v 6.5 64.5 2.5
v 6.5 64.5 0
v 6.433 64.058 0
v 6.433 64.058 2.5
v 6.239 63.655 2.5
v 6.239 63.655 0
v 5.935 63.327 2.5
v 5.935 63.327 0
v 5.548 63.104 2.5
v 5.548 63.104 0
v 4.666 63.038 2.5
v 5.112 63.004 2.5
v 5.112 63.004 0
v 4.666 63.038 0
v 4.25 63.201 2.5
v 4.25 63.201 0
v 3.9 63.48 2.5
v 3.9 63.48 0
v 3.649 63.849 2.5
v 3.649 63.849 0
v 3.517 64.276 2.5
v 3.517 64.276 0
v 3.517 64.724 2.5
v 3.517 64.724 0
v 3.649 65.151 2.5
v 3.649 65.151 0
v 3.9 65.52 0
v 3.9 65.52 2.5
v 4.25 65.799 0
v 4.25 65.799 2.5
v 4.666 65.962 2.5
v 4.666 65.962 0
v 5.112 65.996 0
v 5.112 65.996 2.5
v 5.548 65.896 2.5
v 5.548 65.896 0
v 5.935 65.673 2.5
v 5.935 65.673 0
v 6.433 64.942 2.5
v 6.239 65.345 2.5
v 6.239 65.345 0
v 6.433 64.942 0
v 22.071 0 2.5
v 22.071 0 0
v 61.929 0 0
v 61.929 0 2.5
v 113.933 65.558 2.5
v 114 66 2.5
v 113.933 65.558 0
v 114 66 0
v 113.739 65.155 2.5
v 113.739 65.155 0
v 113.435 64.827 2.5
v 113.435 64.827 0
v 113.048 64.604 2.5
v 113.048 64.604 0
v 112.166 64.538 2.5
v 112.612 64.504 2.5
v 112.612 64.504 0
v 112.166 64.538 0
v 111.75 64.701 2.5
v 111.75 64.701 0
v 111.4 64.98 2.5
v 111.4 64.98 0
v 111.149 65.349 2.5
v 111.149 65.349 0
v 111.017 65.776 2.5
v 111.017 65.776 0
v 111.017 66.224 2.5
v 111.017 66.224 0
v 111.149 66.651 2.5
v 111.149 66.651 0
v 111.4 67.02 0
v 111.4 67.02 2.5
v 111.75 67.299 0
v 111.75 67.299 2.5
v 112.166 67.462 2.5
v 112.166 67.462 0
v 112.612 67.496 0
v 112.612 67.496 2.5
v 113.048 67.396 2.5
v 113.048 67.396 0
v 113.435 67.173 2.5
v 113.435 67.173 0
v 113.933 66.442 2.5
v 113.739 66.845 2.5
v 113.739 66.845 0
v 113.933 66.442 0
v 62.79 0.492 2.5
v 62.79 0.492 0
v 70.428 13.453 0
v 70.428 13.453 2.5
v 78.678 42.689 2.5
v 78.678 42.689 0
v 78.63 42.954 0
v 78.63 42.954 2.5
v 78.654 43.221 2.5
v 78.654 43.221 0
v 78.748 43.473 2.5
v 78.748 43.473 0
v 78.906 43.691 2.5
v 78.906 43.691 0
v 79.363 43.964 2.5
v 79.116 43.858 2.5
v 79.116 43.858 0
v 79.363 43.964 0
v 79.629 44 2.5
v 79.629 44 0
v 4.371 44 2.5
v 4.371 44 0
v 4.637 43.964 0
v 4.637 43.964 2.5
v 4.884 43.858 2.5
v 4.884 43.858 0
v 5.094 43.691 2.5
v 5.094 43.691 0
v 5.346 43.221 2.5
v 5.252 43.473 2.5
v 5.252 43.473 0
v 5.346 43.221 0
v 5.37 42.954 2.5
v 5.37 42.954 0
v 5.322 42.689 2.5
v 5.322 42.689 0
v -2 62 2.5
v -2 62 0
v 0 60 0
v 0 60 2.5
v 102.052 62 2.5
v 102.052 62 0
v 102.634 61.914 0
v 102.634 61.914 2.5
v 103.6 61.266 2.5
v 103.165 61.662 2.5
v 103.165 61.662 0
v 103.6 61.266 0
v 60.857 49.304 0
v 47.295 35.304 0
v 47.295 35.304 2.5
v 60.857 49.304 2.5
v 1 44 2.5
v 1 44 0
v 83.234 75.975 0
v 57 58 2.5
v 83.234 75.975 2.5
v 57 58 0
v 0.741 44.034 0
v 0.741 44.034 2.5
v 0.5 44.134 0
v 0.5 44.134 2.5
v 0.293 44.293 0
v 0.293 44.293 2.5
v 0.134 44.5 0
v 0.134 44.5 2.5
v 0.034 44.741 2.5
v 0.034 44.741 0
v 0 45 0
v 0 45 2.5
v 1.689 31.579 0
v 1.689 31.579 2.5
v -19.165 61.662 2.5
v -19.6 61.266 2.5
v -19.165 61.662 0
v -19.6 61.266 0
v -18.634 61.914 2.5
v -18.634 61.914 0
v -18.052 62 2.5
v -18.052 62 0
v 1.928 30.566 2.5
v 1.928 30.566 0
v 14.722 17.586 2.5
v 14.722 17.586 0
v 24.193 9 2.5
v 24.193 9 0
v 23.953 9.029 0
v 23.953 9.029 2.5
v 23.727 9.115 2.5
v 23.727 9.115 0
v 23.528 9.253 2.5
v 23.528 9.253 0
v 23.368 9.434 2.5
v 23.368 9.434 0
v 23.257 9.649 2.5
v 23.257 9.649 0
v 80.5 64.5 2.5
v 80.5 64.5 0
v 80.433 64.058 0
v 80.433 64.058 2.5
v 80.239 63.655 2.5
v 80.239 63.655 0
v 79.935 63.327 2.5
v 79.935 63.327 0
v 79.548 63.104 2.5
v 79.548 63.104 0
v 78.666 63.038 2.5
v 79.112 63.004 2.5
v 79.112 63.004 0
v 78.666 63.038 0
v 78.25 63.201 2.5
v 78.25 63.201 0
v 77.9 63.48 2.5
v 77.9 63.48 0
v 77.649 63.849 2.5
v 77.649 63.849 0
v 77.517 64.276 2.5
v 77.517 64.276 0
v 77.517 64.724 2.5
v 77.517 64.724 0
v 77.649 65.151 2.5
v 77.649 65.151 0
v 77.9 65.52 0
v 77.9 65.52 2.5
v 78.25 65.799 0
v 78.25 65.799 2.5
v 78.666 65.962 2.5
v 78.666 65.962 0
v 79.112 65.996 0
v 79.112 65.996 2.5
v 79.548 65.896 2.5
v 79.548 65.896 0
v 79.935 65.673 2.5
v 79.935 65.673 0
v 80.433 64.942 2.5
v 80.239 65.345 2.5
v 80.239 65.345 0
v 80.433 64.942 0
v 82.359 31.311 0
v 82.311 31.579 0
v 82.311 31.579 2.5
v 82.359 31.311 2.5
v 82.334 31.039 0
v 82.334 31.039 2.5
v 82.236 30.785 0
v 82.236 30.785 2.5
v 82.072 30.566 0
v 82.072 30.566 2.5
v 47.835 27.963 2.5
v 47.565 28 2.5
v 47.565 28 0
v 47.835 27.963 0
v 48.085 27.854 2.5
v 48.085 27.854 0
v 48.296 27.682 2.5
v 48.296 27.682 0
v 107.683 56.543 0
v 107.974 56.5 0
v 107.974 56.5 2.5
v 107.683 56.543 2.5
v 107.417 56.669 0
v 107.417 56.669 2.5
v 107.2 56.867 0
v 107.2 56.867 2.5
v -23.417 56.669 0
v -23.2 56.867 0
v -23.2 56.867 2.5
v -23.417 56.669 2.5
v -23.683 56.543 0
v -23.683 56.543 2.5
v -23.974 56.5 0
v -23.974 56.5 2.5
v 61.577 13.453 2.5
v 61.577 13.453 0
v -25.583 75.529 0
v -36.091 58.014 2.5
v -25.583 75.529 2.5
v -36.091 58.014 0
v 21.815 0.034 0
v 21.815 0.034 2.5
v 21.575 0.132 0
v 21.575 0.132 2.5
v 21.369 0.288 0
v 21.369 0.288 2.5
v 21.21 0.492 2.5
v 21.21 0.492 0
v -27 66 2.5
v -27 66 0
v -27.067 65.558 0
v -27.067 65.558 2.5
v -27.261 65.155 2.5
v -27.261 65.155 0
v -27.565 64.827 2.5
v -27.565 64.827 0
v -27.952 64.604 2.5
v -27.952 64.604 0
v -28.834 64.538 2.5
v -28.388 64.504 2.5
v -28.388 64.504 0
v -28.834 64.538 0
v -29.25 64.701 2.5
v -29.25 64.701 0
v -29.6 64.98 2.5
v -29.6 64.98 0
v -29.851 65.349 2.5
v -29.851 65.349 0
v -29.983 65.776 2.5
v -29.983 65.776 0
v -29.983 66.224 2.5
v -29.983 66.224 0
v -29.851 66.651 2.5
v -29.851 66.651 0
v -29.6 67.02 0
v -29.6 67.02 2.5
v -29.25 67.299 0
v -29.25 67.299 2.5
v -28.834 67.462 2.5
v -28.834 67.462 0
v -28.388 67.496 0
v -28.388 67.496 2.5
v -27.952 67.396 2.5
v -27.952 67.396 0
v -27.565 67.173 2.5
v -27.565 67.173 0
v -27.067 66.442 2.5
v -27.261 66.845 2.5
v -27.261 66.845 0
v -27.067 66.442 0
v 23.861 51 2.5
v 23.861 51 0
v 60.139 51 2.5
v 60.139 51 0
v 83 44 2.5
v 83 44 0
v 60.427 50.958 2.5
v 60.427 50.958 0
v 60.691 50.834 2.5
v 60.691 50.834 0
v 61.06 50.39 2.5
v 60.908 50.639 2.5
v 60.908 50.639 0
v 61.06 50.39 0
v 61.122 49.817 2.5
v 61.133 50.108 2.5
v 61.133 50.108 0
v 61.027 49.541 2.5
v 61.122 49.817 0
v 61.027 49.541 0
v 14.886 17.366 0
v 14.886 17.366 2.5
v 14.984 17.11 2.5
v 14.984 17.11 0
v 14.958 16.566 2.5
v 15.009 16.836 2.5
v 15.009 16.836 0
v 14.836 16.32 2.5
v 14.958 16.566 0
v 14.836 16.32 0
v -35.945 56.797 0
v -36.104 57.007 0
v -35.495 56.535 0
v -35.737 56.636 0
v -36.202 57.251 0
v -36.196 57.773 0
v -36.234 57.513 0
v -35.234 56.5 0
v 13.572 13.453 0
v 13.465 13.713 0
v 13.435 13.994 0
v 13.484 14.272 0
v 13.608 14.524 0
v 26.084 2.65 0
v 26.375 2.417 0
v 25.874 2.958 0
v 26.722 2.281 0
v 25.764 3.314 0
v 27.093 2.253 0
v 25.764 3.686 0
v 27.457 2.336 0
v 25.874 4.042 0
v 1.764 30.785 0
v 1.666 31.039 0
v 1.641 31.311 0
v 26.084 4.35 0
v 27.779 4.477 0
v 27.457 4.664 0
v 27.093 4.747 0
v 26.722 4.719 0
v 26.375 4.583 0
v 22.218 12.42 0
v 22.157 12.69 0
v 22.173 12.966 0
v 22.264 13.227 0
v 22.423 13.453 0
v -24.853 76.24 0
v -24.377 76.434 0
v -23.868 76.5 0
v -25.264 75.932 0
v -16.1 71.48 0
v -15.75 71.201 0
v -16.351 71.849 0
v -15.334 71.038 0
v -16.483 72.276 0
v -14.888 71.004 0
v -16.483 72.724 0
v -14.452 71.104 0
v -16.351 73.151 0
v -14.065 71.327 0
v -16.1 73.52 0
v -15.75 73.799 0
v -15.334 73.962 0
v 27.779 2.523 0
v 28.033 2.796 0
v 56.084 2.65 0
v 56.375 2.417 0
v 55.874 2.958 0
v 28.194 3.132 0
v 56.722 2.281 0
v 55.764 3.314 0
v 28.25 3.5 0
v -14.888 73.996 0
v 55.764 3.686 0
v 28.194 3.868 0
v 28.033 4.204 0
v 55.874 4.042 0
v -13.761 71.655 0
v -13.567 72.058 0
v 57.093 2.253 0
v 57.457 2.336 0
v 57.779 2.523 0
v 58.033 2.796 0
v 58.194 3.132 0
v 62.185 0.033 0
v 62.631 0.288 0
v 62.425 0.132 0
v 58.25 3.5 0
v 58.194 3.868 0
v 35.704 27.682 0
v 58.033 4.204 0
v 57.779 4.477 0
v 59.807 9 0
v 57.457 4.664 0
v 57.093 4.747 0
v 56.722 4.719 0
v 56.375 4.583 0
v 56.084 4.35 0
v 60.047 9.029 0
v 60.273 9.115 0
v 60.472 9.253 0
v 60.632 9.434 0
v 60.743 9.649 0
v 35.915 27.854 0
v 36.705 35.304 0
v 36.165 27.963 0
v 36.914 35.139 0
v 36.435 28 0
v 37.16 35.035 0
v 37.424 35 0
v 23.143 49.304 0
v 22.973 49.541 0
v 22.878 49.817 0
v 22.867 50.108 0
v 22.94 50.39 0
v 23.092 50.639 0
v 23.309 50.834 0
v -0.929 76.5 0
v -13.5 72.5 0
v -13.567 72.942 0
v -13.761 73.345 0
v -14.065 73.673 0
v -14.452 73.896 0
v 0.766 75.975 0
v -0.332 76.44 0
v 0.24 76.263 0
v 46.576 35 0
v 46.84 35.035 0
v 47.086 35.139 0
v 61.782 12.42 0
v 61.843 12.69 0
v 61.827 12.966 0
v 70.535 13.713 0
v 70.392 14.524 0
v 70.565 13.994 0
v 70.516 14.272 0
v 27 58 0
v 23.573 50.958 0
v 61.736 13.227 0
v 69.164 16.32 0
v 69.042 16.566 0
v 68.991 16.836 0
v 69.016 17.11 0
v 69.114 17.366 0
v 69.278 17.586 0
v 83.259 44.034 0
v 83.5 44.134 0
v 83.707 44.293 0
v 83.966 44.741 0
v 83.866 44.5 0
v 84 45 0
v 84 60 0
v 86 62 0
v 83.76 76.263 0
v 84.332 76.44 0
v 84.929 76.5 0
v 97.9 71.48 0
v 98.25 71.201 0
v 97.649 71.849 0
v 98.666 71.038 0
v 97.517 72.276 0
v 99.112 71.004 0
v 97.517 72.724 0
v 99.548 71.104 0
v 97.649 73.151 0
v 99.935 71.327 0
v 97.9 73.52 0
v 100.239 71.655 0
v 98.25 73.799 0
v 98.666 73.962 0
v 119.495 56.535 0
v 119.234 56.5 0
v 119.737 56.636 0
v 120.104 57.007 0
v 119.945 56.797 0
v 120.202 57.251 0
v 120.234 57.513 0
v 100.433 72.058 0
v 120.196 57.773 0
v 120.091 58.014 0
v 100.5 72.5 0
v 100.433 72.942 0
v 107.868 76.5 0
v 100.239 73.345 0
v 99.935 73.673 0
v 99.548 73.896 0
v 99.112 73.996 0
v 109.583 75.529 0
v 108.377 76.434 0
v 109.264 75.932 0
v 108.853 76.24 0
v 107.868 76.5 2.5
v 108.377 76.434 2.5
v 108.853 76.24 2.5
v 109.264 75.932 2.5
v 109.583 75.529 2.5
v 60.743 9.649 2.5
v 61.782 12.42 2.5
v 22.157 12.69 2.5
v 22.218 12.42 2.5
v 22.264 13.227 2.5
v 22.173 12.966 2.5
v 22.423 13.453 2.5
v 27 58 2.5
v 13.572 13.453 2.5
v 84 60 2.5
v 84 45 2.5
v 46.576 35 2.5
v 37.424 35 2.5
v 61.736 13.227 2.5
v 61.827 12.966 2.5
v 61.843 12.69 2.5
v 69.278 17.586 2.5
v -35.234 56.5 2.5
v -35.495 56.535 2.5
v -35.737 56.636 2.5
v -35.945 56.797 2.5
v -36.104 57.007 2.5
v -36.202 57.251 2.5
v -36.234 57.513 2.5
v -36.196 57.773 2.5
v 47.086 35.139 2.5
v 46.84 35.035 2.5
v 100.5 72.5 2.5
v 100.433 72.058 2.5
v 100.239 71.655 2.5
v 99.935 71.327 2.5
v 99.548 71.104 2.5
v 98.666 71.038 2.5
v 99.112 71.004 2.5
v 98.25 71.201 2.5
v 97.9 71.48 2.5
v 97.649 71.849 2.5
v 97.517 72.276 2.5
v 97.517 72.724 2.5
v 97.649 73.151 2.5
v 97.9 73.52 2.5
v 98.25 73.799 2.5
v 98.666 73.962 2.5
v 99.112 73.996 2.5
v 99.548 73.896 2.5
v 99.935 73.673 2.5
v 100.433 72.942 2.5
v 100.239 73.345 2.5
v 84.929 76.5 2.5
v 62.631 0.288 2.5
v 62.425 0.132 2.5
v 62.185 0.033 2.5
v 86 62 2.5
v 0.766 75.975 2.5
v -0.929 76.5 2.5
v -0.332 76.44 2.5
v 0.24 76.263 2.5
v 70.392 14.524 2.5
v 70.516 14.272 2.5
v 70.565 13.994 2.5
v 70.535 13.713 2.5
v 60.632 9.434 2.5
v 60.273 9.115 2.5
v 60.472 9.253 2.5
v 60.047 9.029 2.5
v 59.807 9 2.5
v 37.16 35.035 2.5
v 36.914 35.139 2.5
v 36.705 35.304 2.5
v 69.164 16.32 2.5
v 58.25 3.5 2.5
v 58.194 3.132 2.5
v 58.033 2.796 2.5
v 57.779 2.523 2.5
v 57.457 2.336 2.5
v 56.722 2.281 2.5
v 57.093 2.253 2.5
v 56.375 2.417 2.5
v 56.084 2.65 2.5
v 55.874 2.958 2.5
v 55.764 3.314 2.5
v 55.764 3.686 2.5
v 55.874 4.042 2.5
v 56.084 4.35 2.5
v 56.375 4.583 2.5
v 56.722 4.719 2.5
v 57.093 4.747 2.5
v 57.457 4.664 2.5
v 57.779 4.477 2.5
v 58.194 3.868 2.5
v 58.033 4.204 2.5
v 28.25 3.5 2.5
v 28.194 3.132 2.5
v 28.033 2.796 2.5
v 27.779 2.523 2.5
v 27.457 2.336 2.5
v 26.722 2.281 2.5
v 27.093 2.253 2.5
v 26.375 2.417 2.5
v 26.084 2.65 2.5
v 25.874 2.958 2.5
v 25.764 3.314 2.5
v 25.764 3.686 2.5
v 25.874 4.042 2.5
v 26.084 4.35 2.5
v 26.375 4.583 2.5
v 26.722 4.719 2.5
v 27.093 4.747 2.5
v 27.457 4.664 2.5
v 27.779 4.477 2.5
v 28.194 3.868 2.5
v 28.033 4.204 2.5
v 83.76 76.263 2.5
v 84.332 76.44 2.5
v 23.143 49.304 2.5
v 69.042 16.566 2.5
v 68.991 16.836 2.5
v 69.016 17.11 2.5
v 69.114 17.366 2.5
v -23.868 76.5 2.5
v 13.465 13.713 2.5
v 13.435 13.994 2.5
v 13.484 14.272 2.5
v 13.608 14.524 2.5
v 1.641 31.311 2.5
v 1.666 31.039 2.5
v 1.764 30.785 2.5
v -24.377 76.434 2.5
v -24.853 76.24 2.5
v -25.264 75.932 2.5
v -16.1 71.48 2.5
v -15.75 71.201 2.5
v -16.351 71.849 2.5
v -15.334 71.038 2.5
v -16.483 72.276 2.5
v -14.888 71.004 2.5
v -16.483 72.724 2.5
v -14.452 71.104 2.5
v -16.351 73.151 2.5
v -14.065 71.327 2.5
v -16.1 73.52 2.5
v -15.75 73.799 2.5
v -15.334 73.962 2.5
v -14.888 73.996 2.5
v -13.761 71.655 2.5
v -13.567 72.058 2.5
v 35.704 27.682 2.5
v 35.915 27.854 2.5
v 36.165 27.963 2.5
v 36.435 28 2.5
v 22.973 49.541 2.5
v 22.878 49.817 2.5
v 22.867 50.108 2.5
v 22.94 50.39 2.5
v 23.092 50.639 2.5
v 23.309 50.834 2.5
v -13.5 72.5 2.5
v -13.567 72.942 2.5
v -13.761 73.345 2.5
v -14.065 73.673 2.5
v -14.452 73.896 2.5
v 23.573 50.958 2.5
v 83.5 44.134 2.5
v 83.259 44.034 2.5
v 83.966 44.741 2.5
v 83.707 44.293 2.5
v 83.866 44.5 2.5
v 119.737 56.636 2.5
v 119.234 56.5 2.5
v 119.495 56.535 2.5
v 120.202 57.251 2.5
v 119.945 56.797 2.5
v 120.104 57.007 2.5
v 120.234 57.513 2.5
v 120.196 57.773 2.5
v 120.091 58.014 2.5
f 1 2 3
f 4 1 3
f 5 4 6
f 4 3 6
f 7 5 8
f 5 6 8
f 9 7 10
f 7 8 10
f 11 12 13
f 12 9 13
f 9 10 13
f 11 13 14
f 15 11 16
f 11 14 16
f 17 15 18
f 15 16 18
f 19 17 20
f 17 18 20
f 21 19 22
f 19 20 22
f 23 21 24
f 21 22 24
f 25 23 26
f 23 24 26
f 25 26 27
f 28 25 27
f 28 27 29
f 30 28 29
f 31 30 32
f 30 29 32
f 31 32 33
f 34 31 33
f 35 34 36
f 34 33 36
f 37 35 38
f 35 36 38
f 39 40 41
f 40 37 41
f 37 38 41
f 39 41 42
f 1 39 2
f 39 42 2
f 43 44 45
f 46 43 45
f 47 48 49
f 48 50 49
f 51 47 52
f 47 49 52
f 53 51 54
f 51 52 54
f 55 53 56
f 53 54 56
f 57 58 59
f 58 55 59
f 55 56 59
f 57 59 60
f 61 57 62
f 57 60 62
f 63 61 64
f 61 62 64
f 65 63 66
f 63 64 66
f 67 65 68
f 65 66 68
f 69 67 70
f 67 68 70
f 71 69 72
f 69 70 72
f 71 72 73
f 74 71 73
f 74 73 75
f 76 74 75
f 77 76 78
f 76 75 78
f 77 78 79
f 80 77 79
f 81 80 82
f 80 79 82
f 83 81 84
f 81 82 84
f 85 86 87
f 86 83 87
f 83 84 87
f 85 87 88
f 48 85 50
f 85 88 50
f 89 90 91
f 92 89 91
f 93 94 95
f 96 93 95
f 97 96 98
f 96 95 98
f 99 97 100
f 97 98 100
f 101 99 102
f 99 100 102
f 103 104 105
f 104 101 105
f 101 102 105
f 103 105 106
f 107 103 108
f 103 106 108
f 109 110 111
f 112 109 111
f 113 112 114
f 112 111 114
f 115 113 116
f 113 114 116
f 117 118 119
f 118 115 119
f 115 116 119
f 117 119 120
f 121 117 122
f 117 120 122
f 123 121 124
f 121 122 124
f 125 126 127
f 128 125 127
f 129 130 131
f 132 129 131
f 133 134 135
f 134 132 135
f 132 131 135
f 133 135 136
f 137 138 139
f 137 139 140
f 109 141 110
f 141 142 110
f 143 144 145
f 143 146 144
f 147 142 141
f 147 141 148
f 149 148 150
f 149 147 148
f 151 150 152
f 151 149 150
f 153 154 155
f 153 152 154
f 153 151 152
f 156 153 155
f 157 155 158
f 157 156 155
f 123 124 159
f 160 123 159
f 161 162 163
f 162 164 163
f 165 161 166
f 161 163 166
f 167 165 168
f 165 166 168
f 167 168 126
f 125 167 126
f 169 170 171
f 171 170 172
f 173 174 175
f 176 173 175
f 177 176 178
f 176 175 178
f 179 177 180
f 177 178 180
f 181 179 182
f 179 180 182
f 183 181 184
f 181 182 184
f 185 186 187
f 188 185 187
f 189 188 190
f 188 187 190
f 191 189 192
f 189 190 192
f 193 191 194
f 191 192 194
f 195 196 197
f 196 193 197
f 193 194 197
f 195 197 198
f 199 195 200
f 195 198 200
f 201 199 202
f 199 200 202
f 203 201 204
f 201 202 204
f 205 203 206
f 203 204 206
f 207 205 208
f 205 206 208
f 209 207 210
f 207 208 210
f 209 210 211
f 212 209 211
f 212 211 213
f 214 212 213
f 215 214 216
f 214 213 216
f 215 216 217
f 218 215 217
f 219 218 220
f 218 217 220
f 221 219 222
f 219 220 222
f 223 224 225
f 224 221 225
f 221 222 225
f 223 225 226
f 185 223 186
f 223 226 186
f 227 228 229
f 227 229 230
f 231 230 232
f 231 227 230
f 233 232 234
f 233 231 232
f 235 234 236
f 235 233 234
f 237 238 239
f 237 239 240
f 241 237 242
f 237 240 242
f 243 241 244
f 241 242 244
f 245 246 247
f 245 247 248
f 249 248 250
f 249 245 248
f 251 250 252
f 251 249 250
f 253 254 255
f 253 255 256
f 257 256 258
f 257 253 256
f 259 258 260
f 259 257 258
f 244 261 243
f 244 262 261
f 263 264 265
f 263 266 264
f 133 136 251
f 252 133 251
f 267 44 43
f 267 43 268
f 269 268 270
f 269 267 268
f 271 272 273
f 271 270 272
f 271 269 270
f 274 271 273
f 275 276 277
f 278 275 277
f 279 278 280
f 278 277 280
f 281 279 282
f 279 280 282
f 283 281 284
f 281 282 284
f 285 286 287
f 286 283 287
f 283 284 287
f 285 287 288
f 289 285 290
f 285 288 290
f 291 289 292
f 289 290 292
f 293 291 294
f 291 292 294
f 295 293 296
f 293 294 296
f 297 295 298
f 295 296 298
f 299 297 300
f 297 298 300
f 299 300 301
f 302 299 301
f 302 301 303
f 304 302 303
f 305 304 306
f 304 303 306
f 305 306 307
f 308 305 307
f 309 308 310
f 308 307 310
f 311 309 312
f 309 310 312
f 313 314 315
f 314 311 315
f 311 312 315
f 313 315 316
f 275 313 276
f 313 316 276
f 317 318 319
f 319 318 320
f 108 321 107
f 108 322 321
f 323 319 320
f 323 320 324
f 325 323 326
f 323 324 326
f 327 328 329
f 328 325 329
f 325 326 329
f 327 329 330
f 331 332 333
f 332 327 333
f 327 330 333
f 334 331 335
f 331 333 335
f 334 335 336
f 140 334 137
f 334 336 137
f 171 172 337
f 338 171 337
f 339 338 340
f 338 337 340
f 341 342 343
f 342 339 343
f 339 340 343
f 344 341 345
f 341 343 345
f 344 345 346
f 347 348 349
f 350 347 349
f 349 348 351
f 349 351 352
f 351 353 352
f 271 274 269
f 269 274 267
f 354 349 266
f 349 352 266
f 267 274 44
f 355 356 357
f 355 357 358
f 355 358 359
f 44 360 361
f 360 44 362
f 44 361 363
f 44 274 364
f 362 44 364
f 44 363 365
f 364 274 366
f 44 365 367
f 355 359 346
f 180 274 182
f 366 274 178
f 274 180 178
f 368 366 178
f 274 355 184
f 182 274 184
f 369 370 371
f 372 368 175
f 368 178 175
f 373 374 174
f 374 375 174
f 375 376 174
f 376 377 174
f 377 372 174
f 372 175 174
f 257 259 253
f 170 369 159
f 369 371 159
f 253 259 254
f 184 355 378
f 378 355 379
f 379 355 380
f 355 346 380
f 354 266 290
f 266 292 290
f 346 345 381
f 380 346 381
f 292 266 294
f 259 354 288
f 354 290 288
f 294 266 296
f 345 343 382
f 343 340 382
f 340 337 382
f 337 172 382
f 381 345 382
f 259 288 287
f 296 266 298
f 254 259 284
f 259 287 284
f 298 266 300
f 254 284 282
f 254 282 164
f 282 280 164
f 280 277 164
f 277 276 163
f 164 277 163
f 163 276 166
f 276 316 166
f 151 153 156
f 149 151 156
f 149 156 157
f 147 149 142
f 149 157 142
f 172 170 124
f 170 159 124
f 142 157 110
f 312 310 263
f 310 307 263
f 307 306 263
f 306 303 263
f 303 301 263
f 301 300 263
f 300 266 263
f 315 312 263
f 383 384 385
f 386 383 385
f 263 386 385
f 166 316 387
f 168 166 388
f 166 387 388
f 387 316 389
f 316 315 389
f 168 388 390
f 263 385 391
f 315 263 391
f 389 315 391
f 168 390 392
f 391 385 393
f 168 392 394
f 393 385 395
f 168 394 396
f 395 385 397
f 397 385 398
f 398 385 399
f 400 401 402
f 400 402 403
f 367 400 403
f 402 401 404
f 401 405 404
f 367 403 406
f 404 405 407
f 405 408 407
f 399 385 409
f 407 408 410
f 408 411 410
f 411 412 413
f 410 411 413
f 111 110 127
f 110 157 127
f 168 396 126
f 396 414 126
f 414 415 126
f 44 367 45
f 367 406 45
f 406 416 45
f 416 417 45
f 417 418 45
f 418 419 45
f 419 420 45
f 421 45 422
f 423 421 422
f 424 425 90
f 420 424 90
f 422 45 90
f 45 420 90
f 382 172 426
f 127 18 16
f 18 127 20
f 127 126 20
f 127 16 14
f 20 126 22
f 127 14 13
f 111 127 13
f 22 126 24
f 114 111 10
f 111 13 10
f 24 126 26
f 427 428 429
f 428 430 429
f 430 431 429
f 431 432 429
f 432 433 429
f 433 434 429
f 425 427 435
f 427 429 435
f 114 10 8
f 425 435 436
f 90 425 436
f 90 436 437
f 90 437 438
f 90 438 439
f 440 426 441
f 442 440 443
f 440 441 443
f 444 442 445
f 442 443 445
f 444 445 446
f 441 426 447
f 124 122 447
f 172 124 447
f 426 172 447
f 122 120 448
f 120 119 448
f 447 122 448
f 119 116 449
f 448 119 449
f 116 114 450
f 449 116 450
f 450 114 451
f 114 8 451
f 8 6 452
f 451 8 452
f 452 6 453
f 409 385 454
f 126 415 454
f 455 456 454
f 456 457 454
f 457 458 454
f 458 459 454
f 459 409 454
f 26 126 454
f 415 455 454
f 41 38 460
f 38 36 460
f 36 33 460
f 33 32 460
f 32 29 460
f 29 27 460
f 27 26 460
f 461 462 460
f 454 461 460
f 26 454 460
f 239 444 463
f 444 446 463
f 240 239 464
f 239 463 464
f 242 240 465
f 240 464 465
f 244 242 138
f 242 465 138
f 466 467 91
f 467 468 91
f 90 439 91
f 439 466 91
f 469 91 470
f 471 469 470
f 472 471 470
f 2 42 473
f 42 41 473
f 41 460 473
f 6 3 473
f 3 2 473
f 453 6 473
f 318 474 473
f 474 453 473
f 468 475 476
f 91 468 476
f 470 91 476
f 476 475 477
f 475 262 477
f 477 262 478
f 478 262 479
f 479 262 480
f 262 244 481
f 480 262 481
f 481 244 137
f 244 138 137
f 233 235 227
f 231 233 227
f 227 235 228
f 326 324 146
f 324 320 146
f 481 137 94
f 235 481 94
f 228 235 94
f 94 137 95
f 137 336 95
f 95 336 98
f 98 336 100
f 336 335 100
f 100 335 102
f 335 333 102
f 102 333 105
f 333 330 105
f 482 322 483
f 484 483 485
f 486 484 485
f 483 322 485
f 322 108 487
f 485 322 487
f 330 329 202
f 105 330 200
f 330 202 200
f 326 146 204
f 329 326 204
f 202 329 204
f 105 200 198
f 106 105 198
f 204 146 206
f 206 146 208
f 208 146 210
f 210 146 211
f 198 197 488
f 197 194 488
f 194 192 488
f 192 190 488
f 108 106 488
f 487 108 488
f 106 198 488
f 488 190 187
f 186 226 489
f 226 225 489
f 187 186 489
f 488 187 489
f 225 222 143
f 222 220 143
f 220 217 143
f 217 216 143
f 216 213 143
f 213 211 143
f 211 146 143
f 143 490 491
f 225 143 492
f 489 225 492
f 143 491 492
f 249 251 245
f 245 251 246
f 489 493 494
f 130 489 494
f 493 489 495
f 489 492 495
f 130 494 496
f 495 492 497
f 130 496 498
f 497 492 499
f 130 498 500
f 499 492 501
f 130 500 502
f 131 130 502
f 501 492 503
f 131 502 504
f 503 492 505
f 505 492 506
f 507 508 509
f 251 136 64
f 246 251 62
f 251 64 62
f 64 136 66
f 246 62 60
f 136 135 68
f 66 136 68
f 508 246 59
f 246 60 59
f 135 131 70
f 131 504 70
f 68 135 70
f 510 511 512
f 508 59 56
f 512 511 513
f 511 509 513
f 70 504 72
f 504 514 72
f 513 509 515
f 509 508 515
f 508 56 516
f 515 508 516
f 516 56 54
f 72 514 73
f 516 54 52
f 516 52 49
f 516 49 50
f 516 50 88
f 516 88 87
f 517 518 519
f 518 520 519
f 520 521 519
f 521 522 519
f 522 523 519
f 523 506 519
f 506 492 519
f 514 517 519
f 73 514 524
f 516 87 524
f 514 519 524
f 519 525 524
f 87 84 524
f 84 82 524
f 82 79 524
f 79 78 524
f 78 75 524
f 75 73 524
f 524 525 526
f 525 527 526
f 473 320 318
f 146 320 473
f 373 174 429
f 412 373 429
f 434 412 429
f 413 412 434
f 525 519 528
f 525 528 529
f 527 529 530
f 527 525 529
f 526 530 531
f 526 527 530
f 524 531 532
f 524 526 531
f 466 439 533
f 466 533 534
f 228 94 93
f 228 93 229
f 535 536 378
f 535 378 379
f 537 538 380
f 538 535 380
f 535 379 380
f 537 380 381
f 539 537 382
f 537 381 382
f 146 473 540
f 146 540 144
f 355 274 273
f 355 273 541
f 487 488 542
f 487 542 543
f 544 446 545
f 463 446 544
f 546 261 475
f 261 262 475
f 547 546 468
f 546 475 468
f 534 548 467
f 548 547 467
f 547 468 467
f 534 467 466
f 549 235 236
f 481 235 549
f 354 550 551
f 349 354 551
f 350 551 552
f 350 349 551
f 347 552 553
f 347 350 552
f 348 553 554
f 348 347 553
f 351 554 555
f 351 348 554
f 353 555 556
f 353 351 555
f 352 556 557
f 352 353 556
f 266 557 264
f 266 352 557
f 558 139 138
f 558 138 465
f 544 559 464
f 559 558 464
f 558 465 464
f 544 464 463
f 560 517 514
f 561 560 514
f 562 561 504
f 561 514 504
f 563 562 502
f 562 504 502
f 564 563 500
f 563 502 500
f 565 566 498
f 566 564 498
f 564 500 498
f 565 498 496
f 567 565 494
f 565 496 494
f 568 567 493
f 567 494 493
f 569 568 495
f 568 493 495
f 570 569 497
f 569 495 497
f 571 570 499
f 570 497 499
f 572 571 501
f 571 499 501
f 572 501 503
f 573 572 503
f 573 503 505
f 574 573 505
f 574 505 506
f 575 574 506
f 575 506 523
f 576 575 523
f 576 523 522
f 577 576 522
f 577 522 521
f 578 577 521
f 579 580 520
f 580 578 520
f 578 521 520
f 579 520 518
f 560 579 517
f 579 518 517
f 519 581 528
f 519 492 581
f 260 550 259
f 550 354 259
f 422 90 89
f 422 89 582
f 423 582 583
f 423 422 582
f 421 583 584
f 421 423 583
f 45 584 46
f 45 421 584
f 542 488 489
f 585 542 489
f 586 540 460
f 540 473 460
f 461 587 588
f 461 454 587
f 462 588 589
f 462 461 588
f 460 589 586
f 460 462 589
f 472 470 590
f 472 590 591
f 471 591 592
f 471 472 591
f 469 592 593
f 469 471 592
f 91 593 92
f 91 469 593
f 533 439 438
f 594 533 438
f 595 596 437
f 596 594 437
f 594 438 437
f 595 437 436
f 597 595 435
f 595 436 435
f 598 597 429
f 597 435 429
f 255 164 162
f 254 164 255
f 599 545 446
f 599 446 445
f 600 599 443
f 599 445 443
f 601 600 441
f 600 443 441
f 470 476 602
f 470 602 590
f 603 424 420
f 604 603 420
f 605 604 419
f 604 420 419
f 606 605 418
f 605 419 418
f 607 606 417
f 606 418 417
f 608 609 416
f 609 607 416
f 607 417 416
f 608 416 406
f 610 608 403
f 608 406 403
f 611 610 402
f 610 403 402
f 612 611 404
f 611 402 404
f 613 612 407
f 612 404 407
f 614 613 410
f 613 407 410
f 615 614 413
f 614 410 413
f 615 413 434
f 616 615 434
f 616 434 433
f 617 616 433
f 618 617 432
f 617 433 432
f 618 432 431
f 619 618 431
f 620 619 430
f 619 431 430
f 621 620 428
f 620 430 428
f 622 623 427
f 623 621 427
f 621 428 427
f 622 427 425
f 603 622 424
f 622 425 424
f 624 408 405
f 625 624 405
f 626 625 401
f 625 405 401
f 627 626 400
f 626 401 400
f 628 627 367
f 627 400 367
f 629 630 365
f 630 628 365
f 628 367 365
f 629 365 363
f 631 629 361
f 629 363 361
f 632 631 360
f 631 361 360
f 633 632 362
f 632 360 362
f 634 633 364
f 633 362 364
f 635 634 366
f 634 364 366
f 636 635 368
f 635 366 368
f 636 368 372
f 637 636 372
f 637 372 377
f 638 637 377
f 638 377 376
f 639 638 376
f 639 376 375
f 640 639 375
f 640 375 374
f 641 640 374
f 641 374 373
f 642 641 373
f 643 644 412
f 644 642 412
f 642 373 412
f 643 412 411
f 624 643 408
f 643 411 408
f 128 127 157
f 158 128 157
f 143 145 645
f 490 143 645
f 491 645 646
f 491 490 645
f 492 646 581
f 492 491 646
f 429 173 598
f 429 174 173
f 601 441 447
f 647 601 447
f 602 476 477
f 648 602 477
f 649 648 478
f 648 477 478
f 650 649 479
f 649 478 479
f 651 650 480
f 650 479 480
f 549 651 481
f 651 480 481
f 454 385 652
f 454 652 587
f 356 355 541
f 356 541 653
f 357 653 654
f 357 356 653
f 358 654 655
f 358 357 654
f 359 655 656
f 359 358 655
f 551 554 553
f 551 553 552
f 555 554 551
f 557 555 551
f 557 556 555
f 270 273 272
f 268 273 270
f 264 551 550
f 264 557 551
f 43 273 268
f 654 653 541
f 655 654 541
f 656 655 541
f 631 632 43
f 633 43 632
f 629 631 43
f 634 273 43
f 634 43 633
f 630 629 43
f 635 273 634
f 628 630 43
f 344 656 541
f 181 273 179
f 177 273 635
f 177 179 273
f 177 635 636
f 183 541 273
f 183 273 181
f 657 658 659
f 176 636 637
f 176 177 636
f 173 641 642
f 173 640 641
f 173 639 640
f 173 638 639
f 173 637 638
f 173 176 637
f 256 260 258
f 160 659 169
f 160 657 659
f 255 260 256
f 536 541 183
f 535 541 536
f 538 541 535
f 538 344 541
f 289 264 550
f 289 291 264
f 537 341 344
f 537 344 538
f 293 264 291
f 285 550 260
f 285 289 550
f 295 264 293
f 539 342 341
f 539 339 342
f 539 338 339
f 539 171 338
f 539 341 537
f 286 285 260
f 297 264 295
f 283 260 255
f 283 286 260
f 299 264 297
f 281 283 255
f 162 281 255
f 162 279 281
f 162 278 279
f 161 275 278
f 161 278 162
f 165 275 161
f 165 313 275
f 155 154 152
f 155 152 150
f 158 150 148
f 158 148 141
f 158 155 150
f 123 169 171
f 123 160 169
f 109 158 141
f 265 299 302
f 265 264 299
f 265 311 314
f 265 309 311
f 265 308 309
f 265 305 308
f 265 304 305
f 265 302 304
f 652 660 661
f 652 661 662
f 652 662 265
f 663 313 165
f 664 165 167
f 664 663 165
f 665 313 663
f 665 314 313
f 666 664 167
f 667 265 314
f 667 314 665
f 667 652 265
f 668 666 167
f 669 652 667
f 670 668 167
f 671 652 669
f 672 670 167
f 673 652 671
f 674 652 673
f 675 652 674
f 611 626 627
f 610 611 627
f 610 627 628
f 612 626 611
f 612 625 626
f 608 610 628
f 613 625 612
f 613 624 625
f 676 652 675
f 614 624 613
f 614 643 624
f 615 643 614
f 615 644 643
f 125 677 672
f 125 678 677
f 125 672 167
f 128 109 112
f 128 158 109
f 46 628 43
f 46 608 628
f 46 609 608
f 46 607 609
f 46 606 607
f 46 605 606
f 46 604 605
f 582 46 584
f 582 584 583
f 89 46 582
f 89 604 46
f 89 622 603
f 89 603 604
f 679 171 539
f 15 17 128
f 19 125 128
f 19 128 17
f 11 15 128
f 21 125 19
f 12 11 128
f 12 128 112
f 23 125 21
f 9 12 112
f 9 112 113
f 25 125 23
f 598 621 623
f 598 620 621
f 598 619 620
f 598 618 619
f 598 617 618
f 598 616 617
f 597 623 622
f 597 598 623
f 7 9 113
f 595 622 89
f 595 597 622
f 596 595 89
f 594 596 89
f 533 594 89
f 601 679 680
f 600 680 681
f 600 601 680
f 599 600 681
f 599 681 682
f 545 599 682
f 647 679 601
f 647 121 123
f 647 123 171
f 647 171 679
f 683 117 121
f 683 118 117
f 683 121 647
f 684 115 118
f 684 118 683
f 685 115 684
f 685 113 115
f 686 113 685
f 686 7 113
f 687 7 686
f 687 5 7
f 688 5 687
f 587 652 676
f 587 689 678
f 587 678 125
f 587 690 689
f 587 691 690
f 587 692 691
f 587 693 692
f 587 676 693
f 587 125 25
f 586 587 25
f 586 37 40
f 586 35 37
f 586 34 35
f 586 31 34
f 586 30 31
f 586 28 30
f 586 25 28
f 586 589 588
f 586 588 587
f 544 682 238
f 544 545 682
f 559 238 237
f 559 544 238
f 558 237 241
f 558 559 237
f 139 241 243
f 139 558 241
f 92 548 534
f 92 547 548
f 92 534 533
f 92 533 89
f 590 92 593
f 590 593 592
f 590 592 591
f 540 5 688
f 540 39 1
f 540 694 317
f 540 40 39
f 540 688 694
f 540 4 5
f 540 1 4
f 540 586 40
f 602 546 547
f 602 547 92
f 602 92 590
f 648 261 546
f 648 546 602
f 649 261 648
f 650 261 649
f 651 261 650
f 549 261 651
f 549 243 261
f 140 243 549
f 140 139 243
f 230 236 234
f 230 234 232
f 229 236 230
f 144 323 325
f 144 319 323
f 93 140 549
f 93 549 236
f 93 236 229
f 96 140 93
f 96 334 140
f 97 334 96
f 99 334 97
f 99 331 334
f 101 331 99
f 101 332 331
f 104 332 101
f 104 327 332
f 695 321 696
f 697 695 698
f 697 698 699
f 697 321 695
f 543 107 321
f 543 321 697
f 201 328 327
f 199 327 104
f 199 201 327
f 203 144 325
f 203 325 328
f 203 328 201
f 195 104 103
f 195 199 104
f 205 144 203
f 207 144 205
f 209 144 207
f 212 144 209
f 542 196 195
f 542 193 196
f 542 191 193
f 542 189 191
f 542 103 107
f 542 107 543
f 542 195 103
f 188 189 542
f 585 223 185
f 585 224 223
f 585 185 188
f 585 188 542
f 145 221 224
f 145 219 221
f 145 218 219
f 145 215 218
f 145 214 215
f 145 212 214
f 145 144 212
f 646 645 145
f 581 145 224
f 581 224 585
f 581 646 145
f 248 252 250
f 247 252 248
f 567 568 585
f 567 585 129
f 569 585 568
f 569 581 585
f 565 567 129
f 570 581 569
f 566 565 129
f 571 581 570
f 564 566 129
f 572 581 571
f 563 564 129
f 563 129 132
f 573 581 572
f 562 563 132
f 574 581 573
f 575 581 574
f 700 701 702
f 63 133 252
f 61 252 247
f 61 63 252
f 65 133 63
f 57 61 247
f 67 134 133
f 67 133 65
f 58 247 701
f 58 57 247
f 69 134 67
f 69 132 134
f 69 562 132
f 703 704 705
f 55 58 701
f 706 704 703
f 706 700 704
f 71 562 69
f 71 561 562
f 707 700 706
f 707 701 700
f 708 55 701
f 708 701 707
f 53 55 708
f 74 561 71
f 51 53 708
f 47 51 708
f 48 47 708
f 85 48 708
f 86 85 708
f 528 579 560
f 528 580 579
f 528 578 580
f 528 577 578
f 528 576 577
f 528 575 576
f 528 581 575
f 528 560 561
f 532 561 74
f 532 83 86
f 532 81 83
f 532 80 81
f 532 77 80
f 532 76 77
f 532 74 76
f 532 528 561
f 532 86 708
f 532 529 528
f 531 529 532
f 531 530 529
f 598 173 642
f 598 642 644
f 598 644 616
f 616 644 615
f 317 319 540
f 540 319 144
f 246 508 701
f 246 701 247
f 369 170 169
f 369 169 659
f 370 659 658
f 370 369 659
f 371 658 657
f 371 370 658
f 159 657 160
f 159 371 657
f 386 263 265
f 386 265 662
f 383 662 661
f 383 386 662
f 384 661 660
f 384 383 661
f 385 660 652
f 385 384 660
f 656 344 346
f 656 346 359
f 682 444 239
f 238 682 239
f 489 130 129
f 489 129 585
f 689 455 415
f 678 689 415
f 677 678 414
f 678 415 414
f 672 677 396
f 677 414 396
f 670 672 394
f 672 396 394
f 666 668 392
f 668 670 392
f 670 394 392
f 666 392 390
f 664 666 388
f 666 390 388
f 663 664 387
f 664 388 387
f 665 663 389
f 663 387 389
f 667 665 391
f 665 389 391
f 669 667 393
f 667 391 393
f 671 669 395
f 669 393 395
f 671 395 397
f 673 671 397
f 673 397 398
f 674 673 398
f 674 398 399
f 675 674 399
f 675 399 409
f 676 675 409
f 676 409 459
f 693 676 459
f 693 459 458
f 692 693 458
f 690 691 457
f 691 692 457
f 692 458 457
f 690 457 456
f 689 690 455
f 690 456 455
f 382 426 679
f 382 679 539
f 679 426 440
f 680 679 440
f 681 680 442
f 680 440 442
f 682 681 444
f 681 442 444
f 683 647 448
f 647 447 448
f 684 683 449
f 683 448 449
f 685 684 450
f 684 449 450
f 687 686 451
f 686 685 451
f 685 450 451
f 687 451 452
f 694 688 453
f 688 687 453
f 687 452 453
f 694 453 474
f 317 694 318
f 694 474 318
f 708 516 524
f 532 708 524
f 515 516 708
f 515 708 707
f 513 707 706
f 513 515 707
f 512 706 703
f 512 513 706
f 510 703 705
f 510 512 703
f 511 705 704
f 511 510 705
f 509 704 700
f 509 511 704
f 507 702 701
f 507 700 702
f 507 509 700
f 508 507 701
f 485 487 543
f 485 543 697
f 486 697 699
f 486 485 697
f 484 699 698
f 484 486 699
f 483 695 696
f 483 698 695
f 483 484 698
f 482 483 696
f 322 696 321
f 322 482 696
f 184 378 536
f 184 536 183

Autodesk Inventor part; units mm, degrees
ref_plane "YZ Plane" through (0, 0, 0) normal (1, 0, 0) x (0, 1, 0)
ref_plane "XZ Plane" through (0, 0, 0) normal (0, 1, 0) x (-1, 0, 0)
ref_plane "XY Plane" through (0, 0, 0) normal (0, 0, 1) x (1, 0, 0)
sketch "Sketch1" plane through (0, 0, 0) normal (0, 0, 1) x (1, 0, 0)
  line L0 (0, 76.5) -> (84, 76.5) construction
  line L1 (84, 76.5) -> (84, 0) construction
  line L2 (84, 0) -> (0, 0) construction
  line L3 (0, 0) -> (0, 76.5) construction
  line L4 (-37, 76.5) -> (0, 76.5) construction
  line L5 (0, 76.5) -> (0, 62) construction
  line L6 (0, 62) -> (-37, 62) construction
  line L7 (-37, 62) -> (-37, 76.5) construction
  line L8 (84, 76.5) -> (121, 76.5) construction
  line L9 (121, 76.5) -> (121, 62) construction
  line L10 (121, 62) -> (84, 62) construction
  line L11 (84, 62) -> (84, 76.5) construction
  line L12 (27, 58) -> (57, 58)
  line L13 (27, 58) -> (0.7665, 75.9748)
  line L14 (57, 58) -> (83.2335, 75.9748)
  line L15 (13.25, 14) -> (70.75, 14) construction
  line L16 (0, 76.5) -> (-25, 76.5) construction
  line L17 (-37, 76.5) -> (-37, 56.5) construction
  line L18 (-36.0913, 58.0145) -> (-25.5826, 75.529)
  line L19 (-35.2338, 56.5) -> (-23.9739, 56.5)
  line L20 (0, 62) -> (-19, 62) construction
  line L21 (-19.6002, 61.2665) -> (-23.1999, 56.8668)
  line L22 (0, 44) -> (84, 44) construction
  line L23 (1, 44) -> (4.371, 44)
  line L24 (83, 44) -> (79.629, 44)
  line L25 (1.5, 31) -> (82.5, 31) construction
  line L26 (5.3215, 42.6893) -> (1.6893, 31.579)
  line L27 (78.6785, 42.6893) -> (82.3107, 31.579)
  line L28 (15.3, 17) -> (68.7, 17) construction
  line L29 (82.0724, 30.5662) -> (69.278, 17.5864)
  line L30 (1.9276, 30.5662) -> (14.722, 17.5864)
  line L31 (69.1645, 16.3202) -> (70.3916, 14.5245)
  line L32 (14.8355, 16.3202) -> (13.6084, 14.5245)
  line L33 (21.5, 0) -> (62.5, 0) construction
  line L34 (21.2099, 0.4923) -> (13.5725, 13.4527)
  line L35 (62.7901, 0.4923) -> (70.4275, 13.4527)
  line L36 (84, 76.5) -> (109, 76.5) construction
  line L37 (121, 76.5) -> (121, 56.5) construction
  line L38 (120.0913, 58.0145) -> (109.5826, 75.529)
  line L39 (119.2338, 56.5) -> (107.9739, 56.5)
  line L40 (84, 62) -> (103, 62) construction
  line L41 (103.6002, 61.2665) -> (107.1999, 56.8668)
  line L42 (-23.8676, 76.5) -> (-0.9292, 76.5)
  line L43 (84.9292, 76.5) -> (107.8676, 76.5)
  line L44 (-18.0522, 62) -> (-2, 62)
  line L45 (102.0522, 62) -> (86, 62)
  line L46 (0, 60) -> (0, 45)
  line L47 (84, 60) -> (84, 45)
  line L48 (22.0714, 0) -> (61.9286, 0)
  line L49 (23.861, 51) -> (60.139, 51)
  line L50 (37.4235, 35) -> (46.5765, 35)
  line L51 (47.2947, 35.3042) -> (60.8572, 49.3042)
  line L52 (36.7053, 35.3042) -> (23.1428, 49.3042)
  line L53 (36.4346, 28) -> (47.5654, 28)
  line L54 (22, 13) -> (62, 13) construction
  line L55 (24.193, 9) -> (59.807, 9)
  line L56 (60.7433, 9.6489) -> (61.7824, 12.4197)
  line L57 (61.5771, 13.4531) -> (48.2965, 27.6823)
  line L58 (35.7035, 27.6823) -> (22.4229, 13.4531)
  line L59 (22.2176, 12.4197) -> (23.2567, 9.6489)
  line L60 (-28.5, 66) -> (112.5, 66) construction
  line L61 (-15, 72.5) -> (99, 72.5) construction
  line L62 (27, 3.5) -> (57, 3.5) construction
  arc A0 (0.7665, 75.9748) -> (-0.9292, 76.5) centre (-0.9292, 73.5) ccw
  arc A1 (84.9292, 76.5) -> (83.2335, 75.9748) centre (84.9292, 73.5) ccw
  arc A2 (-23.8676, 76.5) -> (-25.5826, 75.529) centre (-23.8676, 74.5) ccw
  arc A3 (109.5826, 75.529) -> (107.8676, 76.5) centre (107.8676, 74.5) ccw
  arc A4 (119.2338, 56.5) -> (120.0913, 58.0145) centre (119.2338, 57.5) ccw
  arc A5 (-36.0913, 58.0145) -> (-35.2338, 56.5) centre (-35.2338, 57.5) ccw
  arc A6 (-23.9739, 56.5) -> (-23.1999, 56.8668) centre (-23.9739, 57.5) ccw
  arc A7 (107.1999, 56.8668) -> (107.9739, 56.5) centre (107.9739, 57.5) ccw
  arc A8 (103.6002, 61.2665) -> (102.0522, 62) centre (102.0522, 60) ccw
  arc A9 (-18.0522, 62) -> (-19.6002, 61.2665) centre (-18.0522, 60) ccw
  line L63 (-2, 62) -> (0, 60)
  line L64 (84, 60) -> (86, 62)
  arc A10 (0, 45) -> (1, 44) centre (1, 45) ccw
  arc A11 (83, 44) -> (84, 45) centre (83, 45) ccw
  arc A12 (79.629, 44) -> (78.6785, 42.6893) centre (79.629, 43) ccw
  arc A13 (5.3215, 42.6893) -> (4.371, 44) centre (4.371, 43) ccw
  arc A14 (1.6893, 31.579) -> (1.9276, 30.5662) centre (2.6398, 31.2682) ccw
  arc A15 (82.0724, 30.5662) -> (82.3107, 31.579) centre (81.3602, 31.2682) ccw
  arc A16 (69.278, 17.5864) -> (69.1645, 16.3202) centre (69.9902, 16.8844) ccw
  arc A17 (70.4275, 13.4527) -> (70.3916, 14.5245) centre (69.5659, 13.9603) ccw
  arc A18 (61.9286, 0) -> (62.7901, 0.4923) centre (61.9286, 1) ccw
  arc A19 (21.2099, 0.4923) -> (22.0714, 0) centre (22.0714, 1) ccw
  arc A20 (13.6084, 14.5245) -> (13.5725, 13.4527) centre (14.4341, 13.9603) ccw
  arc A21 (14.8355, 16.3202) -> (14.722, 17.5864) centre (14.0098, 16.8844) ccw
  arc A22 (23.2567, 9.6489) -> (24.193, 9) centre (24.193, 10) ccw
  arc A23 (22.4229, 13.4531) -> (22.2176, 12.4197) centre (23.154, 12.7708) ccw
  arc A24 (36.4346, 28) -> (35.7035, 27.6823) centre (36.4346, 27) ccw
  arc A25 (48.2965, 27.6823) -> (47.5654, 28) centre (47.5654, 27) ccw
  arc A26 (61.7824, 12.4197) -> (61.5771, 13.4531) centre (60.846, 12.7708) ccw
  arc A27 (59.807, 9) -> (60.7433, 9.6489) centre (59.807, 10) ccw
  arc A28 (23.861, 51) -> (23.1428, 49.3042) centre (23.861, 50) ccw
  arc A29 (60.8572, 49.3042) -> (60.139, 51) centre (60.139, 50) ccw
  arc A30 (46.5765, 35) -> (47.2947, 35.3042) centre (46.5765, 36) ccw
  arc A31 (36.7053, 35.3042) -> (37.4235, 35) centre (37.4235, 36) ccw
  circle A32 centre (-15, 72.5) radius 1.5
  circle A33 centre (-28.5, 66) radius 1.5
  circle A34 centre (112.5, 66) radius 1.5
  circle A35 centre (99, 72.5) radius 1.5
  circle A36 centre (57, 3.5) radius 1.25
  circle A37 centre (27, 3.5) radius 1.25
  line L65 (5, 64.5) -> (79, 64.5) construction
  circle A38 centre (5, 64.5) radius 1.5
  circle A39 centre (79, 64.5) radius 1.5
  point P0 (-23.5, 56.5)
  point P1 (5.75, 44)
  point P2 (78.25, 44)
  point P3 (107.5, 56.5)
  point P4 (21.5, 51)
  point P5 (62.5, 51)
  point P6 (37, 35)
  point P7 (47, 35)
  point P8 (36, 28)
  point P9 (48, 28)
  point P10 (23.5, 9)
  point P11 (60.5, 9)
  dimension "d0" = 84
  dimension "d1" = 76.5
  dimension "d2" = 37
  dimension "d3" = 14.5
  dimension "d4" = 14.5
  dimension "d5" = 37
  dimension "d7" = 30
  dimension "d8" = 27
  dimension "d9" = 58
  dimension "d10" = 57.5
  dimension "d11" = 13.25
  dimension "d12" = 14
  dimension "d13" = 25
  dimension "d14" = 20
  dimension "d15" = 13.5
  dimension "d16" = 19
  dimension "d17" = 18
  dimension "d18" = 5.75
  dimension "d19" = 5.75
  dimension "d20" = 81
  dimension "d21" = 13
  dimension "d22" = 1.5
  dimension "d23" = 53.4
  dimension "d24" = 14
  dimension "d25" = 15.3
  dimension "d26" = 41
  dimension "d27" = 21.5
  dimension "d28" = 25
  dimension "d29" = 20
  dimension "d30" = 13.5
  dimension "d31" = 19
  dimension "d32" = 41
  dimension "d33" = 21.5
  dimension "d34" = 7
  dimension "d35" = 10
  dimension "d36" = 23
  dimension "d37" = 37
  dimension "d38" = 12
  dimension "d39" = 28
  dimension "d40" = 36
  dimension "d41" = 40
  dimension "d42" = 13
  dimension "d43" = 22
  dimension "d44" = 37
  dimension "d45" = 9
  dimension "d46" = 23.5
  dimension "d47" = 141
  dimension "d48" = 10.5
  dimension "d49" = 8.5
  dimension "d50" = 114
  dimension "d51" = 4
  dimension "d52" = 22
  dimension "d53" = 30
  dimension "d54" = 3.5
  dimension "d55" = 27
  dimension "d56" = 3
  dimension "d57" = 3
  dimension "d58" = 2
  dimension "d59" = 2
  dimension "d60" = 1
  dimension "d61" = 1
  dimension "d62" = 1
  dimension "d63" = 1
  dimension "d64" = 2
extrude "Extrusion3" add sketch "Sketch1" along normal blind 2.5
properties part number "RCT-H001_Al_side_plate"
